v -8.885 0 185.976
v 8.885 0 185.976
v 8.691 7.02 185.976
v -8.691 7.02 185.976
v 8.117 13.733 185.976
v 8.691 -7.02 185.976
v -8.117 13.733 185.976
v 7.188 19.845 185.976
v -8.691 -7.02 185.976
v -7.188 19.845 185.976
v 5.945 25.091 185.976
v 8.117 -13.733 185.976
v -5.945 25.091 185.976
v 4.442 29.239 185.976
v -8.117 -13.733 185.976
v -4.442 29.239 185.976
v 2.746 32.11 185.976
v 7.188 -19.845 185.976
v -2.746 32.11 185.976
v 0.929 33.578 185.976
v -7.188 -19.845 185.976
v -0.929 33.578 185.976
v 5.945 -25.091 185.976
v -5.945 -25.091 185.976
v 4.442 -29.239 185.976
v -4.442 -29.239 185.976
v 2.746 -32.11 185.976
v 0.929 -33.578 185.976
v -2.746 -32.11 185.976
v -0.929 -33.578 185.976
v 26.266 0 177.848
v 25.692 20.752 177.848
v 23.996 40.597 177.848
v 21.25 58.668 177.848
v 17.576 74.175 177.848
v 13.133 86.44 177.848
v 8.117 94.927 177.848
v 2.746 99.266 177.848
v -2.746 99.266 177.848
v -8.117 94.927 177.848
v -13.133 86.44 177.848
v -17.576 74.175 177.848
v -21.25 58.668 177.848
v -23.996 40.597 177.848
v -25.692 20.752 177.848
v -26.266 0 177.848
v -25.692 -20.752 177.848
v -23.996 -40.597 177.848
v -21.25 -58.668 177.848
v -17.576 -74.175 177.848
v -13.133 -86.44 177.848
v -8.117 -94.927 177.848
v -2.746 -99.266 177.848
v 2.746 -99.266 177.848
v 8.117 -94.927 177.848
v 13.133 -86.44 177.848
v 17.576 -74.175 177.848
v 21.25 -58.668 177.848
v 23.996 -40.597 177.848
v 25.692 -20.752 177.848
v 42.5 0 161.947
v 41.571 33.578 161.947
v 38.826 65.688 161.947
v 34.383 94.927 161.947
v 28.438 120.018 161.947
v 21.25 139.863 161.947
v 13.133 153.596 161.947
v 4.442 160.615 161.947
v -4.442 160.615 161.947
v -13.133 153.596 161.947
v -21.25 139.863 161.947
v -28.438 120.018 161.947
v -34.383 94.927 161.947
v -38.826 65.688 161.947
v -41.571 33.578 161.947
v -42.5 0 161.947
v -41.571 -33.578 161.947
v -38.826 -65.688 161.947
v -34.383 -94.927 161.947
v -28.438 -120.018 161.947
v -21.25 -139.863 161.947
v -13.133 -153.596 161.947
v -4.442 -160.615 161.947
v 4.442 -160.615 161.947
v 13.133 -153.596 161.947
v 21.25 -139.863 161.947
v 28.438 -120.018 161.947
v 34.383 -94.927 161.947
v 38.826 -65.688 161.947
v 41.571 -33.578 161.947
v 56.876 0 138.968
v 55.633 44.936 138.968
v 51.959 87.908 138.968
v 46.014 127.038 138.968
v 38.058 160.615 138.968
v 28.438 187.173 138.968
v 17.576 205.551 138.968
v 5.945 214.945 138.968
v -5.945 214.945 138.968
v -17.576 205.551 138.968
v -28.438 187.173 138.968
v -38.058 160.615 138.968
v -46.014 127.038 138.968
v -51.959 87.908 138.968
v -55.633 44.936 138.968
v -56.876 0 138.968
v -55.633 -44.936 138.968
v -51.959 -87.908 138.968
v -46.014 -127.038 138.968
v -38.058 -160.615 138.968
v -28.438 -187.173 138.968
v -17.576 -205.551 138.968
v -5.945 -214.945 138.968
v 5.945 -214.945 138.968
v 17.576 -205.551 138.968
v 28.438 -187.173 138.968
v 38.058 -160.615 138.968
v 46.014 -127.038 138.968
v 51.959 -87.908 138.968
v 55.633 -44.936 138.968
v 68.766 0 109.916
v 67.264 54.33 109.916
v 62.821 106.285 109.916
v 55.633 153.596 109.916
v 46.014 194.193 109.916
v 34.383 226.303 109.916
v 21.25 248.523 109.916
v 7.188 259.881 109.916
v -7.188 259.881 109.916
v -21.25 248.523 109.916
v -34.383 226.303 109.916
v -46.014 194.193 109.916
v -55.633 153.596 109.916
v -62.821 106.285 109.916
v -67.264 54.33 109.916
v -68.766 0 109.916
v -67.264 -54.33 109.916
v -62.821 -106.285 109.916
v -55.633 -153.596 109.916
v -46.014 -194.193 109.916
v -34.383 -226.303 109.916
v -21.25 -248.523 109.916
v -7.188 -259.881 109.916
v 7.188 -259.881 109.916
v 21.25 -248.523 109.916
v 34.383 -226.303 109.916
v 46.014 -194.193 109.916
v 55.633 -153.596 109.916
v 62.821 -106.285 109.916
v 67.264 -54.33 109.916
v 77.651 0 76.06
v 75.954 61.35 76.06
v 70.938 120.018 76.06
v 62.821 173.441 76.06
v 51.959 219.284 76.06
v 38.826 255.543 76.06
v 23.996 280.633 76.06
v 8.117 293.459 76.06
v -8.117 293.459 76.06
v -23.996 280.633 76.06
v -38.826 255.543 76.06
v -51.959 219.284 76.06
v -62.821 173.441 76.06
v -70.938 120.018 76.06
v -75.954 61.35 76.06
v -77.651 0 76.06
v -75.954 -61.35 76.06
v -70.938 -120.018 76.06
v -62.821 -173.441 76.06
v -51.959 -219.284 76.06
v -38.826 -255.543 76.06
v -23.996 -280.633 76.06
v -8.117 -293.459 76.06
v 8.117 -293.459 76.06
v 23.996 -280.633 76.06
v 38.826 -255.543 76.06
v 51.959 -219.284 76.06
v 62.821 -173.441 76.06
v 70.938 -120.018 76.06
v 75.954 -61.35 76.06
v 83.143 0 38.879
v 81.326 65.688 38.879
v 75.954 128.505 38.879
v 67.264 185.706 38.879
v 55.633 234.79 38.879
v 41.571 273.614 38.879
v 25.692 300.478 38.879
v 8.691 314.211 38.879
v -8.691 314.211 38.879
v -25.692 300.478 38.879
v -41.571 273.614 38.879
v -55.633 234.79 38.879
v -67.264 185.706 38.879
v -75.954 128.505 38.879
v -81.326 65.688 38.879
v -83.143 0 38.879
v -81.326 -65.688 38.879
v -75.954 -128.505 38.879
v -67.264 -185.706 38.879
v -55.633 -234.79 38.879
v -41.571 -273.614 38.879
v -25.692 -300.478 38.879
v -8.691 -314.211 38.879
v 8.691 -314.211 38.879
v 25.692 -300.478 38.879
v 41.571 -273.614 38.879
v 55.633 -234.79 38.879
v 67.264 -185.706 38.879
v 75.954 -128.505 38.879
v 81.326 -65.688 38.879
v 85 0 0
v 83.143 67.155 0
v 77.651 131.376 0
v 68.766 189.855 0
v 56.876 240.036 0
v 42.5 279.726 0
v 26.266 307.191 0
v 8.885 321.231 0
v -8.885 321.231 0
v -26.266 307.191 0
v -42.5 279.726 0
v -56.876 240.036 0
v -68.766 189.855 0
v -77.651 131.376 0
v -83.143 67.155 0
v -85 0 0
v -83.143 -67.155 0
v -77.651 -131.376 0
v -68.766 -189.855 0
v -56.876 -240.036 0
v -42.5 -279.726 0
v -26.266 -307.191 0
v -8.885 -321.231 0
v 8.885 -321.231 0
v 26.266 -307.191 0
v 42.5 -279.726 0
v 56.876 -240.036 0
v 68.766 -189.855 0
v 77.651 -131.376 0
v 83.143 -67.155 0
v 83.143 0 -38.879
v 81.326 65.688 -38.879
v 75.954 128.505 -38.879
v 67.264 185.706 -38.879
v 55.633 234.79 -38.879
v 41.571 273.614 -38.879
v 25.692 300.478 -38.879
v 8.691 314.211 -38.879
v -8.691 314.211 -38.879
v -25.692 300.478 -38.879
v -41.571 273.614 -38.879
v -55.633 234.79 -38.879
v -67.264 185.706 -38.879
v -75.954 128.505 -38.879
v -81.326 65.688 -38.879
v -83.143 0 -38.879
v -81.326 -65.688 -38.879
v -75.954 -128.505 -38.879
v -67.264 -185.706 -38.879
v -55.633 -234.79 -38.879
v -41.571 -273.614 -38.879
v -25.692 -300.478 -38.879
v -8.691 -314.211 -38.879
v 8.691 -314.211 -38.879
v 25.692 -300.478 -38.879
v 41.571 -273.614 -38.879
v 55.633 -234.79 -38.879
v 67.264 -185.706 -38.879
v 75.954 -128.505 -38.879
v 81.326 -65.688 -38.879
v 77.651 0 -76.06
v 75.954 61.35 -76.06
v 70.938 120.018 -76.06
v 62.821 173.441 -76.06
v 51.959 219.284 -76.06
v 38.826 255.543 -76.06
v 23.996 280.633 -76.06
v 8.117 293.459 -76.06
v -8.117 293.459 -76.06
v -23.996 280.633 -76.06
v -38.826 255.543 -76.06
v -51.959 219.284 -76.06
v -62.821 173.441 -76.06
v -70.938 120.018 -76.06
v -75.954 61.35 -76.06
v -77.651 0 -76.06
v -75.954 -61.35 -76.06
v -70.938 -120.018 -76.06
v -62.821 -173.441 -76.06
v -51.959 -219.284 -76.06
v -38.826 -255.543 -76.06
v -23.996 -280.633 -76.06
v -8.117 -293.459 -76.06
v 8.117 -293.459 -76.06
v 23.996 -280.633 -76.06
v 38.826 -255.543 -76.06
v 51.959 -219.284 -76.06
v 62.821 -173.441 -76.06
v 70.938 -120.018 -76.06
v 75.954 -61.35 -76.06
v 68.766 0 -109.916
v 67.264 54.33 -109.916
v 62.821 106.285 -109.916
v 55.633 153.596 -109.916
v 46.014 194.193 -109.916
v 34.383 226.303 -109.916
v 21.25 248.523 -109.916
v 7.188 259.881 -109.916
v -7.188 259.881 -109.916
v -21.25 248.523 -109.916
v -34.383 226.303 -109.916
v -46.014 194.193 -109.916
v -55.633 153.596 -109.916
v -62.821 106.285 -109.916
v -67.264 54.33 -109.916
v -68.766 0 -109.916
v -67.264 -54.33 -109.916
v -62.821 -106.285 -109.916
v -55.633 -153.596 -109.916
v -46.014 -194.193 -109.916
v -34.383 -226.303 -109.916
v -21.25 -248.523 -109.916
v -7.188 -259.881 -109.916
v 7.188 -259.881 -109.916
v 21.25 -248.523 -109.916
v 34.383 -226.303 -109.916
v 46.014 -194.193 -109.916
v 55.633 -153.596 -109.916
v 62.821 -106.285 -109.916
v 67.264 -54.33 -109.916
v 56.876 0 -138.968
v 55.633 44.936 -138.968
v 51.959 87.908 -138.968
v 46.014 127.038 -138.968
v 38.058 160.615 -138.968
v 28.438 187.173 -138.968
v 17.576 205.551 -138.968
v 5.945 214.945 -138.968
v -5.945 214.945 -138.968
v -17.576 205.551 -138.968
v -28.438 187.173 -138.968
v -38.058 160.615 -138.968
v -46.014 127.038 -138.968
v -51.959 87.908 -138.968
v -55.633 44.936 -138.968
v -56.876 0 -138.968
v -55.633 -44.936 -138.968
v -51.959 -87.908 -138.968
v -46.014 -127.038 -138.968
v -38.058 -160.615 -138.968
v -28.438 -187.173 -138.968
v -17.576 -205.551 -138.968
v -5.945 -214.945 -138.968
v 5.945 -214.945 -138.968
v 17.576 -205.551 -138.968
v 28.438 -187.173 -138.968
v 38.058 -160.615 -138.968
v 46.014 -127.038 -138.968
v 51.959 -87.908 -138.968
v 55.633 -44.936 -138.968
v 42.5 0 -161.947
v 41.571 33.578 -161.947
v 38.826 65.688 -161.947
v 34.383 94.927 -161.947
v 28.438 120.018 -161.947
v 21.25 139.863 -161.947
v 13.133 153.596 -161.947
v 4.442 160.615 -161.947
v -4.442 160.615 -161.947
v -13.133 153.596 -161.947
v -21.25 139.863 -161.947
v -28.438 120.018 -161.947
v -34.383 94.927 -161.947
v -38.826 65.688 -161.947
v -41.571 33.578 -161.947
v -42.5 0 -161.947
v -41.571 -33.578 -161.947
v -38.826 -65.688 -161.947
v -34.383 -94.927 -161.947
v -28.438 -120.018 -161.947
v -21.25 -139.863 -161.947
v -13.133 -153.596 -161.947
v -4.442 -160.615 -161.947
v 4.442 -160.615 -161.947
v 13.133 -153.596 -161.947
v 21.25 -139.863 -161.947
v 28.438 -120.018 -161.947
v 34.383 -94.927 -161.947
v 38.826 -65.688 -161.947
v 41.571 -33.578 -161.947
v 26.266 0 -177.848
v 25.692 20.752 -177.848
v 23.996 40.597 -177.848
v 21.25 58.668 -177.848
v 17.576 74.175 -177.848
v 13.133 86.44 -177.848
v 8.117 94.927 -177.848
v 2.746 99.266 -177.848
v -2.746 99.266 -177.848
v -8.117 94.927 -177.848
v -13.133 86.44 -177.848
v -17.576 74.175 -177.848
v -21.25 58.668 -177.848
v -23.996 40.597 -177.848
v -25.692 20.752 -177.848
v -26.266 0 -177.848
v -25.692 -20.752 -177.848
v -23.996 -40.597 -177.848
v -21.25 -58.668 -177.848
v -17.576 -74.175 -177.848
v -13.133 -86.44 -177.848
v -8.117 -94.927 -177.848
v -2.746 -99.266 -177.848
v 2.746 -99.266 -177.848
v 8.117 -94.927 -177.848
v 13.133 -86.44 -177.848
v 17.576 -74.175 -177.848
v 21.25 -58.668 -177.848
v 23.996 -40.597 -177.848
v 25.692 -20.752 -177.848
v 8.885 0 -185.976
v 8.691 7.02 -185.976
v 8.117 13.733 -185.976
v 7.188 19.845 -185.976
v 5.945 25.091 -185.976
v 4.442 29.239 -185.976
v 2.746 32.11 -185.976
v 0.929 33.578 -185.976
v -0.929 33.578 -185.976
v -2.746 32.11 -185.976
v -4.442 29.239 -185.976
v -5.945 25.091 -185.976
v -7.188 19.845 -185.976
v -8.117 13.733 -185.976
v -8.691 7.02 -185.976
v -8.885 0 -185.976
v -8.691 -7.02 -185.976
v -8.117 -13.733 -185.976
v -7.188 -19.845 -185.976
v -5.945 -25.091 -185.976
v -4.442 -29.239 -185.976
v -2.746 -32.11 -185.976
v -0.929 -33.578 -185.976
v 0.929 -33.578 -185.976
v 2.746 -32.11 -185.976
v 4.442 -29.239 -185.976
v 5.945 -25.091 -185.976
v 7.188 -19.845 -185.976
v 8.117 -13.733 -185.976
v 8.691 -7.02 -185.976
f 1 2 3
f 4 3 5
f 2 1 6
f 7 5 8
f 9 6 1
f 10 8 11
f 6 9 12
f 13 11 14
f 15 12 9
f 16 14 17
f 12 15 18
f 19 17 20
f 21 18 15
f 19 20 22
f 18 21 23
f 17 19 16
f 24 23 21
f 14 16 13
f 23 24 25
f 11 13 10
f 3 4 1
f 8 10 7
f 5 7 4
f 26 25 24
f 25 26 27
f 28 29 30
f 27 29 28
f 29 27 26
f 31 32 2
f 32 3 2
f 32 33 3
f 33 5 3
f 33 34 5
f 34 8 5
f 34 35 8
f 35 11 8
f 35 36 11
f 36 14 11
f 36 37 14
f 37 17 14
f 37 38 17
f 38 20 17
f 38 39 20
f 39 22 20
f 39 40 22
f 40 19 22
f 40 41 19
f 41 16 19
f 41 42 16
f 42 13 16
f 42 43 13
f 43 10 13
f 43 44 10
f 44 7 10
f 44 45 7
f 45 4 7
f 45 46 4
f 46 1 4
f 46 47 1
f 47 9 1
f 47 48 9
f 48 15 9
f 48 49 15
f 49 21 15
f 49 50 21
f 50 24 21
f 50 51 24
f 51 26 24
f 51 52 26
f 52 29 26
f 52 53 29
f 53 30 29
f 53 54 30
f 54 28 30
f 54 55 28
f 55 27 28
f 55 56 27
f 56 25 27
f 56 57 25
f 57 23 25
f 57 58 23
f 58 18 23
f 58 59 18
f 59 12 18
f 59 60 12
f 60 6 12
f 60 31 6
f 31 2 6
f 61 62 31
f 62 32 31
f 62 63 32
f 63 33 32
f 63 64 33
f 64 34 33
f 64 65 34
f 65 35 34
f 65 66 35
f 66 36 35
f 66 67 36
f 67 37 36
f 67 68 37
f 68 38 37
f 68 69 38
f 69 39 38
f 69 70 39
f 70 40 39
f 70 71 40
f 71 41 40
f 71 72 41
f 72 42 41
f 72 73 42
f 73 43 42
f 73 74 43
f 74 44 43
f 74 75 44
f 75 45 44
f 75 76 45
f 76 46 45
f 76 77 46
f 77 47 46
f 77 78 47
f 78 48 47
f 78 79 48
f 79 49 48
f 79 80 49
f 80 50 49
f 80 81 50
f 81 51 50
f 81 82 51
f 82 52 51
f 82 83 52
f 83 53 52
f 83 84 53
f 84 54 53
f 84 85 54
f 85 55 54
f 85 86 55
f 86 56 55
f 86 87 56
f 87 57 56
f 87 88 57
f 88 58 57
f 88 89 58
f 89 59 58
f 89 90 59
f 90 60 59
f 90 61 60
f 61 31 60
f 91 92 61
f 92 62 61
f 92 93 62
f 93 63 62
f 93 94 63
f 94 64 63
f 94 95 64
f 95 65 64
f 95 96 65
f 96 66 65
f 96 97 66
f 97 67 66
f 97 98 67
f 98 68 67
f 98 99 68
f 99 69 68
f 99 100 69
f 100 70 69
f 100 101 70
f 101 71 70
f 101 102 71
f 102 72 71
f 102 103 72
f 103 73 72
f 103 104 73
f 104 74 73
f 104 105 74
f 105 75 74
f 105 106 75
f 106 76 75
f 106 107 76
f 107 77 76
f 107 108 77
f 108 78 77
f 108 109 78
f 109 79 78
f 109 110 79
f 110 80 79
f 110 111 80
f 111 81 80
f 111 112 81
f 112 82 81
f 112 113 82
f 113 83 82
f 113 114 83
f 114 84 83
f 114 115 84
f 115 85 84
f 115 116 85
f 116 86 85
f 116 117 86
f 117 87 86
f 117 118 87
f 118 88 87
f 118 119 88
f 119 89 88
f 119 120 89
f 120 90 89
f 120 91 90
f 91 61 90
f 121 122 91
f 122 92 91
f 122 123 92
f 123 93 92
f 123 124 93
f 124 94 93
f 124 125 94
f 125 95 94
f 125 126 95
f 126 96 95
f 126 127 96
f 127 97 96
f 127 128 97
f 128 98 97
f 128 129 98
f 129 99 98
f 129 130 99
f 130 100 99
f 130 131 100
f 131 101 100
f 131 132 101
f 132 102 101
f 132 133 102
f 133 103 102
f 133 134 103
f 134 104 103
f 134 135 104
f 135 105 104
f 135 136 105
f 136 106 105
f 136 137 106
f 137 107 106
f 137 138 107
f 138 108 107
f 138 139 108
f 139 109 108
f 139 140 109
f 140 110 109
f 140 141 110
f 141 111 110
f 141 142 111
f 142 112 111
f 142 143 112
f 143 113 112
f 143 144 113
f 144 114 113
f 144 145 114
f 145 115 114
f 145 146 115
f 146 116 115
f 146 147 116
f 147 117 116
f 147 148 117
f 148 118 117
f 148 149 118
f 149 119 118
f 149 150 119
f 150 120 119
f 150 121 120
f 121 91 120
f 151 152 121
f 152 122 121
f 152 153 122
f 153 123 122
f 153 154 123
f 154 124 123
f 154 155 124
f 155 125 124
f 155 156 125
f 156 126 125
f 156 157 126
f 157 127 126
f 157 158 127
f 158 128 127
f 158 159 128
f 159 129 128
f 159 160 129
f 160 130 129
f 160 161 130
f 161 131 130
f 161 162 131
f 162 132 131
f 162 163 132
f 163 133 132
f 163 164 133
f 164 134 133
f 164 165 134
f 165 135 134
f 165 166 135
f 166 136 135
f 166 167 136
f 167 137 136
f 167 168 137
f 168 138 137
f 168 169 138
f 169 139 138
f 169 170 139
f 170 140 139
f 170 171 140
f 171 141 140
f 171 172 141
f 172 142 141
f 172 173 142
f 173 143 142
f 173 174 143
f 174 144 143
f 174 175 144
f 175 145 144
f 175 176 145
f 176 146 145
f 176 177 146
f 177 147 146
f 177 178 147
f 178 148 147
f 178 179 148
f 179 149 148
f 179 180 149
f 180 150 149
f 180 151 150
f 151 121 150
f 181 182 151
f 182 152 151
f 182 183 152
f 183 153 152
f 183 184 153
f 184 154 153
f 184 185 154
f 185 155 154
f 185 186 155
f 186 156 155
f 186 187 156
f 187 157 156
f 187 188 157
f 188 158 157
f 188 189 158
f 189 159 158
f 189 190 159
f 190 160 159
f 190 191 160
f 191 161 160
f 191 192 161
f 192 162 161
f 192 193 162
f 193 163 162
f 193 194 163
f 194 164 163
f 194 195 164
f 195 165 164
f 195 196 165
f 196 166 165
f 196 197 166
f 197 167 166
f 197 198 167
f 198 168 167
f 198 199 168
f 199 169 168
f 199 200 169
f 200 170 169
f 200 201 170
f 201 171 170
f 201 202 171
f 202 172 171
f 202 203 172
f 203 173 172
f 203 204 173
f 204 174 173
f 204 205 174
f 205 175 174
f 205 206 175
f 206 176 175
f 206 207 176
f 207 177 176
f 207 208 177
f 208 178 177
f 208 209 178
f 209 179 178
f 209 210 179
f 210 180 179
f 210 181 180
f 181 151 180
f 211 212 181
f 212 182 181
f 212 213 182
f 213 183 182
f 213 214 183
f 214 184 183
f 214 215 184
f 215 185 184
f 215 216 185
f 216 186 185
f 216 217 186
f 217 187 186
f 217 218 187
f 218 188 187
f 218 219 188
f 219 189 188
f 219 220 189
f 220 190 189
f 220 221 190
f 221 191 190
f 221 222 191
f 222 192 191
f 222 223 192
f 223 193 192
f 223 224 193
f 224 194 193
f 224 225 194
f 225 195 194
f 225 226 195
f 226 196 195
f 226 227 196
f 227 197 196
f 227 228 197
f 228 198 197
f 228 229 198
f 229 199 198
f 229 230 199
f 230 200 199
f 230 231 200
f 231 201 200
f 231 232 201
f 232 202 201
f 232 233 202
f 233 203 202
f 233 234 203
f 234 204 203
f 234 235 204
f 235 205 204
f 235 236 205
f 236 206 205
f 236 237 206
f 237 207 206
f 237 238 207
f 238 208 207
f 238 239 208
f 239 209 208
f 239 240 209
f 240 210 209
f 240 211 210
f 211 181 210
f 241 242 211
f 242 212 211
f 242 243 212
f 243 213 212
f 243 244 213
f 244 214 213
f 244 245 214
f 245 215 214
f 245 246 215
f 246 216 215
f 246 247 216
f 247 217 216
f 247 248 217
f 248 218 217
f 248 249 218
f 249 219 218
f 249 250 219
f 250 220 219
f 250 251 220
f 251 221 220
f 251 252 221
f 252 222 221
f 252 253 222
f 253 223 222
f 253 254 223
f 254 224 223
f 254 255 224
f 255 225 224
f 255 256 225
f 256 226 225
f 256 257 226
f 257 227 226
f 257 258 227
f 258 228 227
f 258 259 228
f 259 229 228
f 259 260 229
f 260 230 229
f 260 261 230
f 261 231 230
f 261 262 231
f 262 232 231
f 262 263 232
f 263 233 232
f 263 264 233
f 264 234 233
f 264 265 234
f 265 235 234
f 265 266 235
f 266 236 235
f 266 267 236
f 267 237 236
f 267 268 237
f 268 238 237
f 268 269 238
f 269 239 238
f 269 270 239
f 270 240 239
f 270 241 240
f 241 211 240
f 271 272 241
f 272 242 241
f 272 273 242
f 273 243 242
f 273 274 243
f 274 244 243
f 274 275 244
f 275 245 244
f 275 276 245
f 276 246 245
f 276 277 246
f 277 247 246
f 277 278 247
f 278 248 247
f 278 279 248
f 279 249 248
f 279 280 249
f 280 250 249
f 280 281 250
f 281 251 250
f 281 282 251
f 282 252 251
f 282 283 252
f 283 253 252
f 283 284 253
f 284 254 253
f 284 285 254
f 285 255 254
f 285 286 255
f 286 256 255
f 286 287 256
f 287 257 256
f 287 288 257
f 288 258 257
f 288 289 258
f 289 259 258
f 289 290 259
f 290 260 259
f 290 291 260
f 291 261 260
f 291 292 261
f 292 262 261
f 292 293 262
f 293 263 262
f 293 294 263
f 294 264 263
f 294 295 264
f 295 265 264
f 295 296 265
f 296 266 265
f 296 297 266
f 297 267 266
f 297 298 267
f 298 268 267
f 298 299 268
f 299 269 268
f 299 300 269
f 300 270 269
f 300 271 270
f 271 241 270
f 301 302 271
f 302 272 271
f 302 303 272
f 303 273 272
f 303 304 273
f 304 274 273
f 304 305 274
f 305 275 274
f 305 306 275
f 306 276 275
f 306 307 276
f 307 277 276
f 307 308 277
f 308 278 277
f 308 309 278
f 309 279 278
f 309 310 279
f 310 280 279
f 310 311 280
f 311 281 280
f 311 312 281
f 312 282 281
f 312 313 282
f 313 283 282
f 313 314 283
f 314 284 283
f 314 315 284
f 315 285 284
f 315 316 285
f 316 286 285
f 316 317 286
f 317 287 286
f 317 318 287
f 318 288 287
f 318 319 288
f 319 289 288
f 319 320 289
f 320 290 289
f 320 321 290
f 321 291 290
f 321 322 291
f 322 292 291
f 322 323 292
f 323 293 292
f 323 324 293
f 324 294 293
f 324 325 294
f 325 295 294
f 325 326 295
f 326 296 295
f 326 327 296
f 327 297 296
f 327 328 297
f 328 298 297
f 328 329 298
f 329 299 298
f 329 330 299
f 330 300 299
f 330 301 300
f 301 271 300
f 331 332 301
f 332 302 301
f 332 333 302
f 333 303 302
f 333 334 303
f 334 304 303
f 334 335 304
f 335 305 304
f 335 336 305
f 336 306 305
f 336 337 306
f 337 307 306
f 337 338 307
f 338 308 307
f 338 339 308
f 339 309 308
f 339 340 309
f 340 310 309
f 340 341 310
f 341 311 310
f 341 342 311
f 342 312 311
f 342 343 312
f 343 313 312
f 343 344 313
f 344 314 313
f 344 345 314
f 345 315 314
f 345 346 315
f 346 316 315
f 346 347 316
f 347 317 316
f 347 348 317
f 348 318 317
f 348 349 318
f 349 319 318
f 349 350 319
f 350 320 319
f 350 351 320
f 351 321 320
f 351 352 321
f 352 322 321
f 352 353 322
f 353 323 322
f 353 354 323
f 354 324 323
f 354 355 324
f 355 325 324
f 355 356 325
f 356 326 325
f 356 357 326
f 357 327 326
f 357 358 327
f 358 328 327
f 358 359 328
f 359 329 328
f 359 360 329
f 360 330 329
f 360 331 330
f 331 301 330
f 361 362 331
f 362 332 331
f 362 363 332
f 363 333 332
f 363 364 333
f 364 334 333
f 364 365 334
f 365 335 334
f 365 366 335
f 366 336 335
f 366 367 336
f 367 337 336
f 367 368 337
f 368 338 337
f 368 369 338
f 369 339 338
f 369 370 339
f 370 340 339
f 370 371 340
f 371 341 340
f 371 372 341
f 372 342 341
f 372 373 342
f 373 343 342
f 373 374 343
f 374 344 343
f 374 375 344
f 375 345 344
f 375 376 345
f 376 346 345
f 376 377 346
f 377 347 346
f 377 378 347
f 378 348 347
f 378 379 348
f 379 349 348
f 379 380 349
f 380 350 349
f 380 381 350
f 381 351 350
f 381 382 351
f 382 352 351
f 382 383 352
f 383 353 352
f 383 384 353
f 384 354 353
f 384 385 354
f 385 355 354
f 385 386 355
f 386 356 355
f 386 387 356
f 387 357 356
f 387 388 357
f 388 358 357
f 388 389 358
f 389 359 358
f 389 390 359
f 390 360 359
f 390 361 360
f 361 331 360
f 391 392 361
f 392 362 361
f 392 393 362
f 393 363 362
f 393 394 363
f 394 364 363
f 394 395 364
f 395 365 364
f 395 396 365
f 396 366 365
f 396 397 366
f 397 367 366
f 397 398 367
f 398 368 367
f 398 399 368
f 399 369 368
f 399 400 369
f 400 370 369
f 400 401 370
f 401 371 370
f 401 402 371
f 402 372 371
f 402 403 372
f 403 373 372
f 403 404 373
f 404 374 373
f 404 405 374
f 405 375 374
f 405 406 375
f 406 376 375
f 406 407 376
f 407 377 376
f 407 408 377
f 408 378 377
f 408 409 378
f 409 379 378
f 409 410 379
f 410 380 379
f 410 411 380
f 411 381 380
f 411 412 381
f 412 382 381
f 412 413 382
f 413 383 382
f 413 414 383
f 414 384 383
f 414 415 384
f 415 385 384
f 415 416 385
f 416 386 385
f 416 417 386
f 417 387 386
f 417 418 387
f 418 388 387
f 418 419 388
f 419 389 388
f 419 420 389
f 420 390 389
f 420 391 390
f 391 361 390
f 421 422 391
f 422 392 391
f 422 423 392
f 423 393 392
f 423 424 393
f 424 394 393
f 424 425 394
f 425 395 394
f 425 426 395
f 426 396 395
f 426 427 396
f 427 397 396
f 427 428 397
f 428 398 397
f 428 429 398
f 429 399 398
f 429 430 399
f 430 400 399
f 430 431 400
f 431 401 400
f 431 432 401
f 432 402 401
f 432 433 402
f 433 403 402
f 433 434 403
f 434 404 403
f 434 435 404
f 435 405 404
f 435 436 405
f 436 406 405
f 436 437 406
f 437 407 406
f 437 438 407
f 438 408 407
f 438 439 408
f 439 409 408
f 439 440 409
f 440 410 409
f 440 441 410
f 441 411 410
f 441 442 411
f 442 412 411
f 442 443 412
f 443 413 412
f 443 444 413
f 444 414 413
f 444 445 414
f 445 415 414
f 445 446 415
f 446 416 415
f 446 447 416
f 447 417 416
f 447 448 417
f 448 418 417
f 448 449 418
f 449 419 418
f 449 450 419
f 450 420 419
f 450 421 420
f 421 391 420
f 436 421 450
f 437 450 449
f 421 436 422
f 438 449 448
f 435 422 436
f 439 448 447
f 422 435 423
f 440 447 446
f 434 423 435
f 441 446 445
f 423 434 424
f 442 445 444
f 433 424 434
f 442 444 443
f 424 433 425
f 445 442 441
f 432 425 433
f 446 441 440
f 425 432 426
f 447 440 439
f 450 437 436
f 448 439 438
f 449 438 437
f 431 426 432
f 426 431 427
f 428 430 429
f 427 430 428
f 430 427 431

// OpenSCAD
// Generated by SolidPython 1.0.1 on 2020-07-29 00:46:47


scale(v = [5, 19, 11]) {
	sphere(r = 17);
}
/***********************************************
*********      SolidPython code:      **********
************************************************
 
# import packages: SolidPython
from solid import *
from solid.utils import *
from itertools import chain, combinations, permutations


class Resize:

    def __init__(self, scad_file):
        self.scad_file = scad_file
        #self.scad_file = import_scad(scad_file)
        # cone/cylinder param:
        self.r1 = 0
        self.r2 = 0
        self.h = 0
        # rectangular prism param:
        self.w = 0
        self.l = 0
        # ellipse param:
        self.r = 0

    # import OpenScad code (file name corresponds to shape)


    # classify shape + parameters
    def assign(self, param1, param2, param3):
        if self.scad_file == 'cone.scad':
            self.r1 = param1
            self.r2 = param2
            self.h = param3
        elif self.scad_file == 'cylinder.scad':
            self.r1 = param1
            self.r2 = param2
            self.h = param3
        elif self.scad_file == 'rectangularPrism.scad':
            self.h = param1
            self.l = param2
            self.w = param3
        else:
            self.r = param1
            self.h = param2

    # resize parameters
    def iterate(self):
        x = range(3, 20, 2)
        i = 1
        if self.scad_file == 'cone.scad':
            tempList = list(permutations(x, 2))
            for temp in tempList:
                param1 = temp[0]
                param2 = temp[1]
                filepath = 'produced_scad_files/' + 'cone' + str(param1) + '_' + str(param2) + '_' + '.scad'
                scad_render_to_file(cylinder(h=param1, r1=param2, r2=0), filepath)

        elif self.scad_file == 'cylinder.scad':
            tempList = list(permutations(x, 3))
            for temp in tempList:
                param1 = temp[0]
                param2 = temp[1]
                filepath = 'produced_scad_files/' + 'cylinder' + str(param1) + '_' + str(param2) + '_' + '.scad'
                scad_render_to_file(cylinder(h=param1, r1=param2, r2=param2), filepath)

        elif self.scad_file == 'rectangularPrism.scad':
            tempList = list(permutations(x, 3))
            for temp in tempList:
                param1 = temp[0]
                param2 = temp[1]
                param3 = temp[2]
                filepath = 'produced_scad_files/' + 'rectangularPrism' + str(param1) + '_' + str(param2) + '_' + str(
                    param3) + '.scad'
                scad_render_to_file(cube(size=(param1, param2, param3)), filepath)

        elif self.scad_file == 'ellipse.scad':
            tempList = list(permutations(x, 4))
            for temp in tempList:
                param1 = temp[0]
                param2 = temp[1]
                param3 = temp[2]
                param4 = temp[3]
                filepath = 'produced_scad_files/' + 'ellipse' + str(param1) + '_' + str(param2) + '_' + str(param3) + '_' + str(param4) + '.scad'
                scad_render_to_file(scale([param1, param2, param3])(sphere(r=param4)), filepath)

    def render_to_scadfile(self):
        scad_render_to_file(scad, 'example.scad') 
 
************************************************/
